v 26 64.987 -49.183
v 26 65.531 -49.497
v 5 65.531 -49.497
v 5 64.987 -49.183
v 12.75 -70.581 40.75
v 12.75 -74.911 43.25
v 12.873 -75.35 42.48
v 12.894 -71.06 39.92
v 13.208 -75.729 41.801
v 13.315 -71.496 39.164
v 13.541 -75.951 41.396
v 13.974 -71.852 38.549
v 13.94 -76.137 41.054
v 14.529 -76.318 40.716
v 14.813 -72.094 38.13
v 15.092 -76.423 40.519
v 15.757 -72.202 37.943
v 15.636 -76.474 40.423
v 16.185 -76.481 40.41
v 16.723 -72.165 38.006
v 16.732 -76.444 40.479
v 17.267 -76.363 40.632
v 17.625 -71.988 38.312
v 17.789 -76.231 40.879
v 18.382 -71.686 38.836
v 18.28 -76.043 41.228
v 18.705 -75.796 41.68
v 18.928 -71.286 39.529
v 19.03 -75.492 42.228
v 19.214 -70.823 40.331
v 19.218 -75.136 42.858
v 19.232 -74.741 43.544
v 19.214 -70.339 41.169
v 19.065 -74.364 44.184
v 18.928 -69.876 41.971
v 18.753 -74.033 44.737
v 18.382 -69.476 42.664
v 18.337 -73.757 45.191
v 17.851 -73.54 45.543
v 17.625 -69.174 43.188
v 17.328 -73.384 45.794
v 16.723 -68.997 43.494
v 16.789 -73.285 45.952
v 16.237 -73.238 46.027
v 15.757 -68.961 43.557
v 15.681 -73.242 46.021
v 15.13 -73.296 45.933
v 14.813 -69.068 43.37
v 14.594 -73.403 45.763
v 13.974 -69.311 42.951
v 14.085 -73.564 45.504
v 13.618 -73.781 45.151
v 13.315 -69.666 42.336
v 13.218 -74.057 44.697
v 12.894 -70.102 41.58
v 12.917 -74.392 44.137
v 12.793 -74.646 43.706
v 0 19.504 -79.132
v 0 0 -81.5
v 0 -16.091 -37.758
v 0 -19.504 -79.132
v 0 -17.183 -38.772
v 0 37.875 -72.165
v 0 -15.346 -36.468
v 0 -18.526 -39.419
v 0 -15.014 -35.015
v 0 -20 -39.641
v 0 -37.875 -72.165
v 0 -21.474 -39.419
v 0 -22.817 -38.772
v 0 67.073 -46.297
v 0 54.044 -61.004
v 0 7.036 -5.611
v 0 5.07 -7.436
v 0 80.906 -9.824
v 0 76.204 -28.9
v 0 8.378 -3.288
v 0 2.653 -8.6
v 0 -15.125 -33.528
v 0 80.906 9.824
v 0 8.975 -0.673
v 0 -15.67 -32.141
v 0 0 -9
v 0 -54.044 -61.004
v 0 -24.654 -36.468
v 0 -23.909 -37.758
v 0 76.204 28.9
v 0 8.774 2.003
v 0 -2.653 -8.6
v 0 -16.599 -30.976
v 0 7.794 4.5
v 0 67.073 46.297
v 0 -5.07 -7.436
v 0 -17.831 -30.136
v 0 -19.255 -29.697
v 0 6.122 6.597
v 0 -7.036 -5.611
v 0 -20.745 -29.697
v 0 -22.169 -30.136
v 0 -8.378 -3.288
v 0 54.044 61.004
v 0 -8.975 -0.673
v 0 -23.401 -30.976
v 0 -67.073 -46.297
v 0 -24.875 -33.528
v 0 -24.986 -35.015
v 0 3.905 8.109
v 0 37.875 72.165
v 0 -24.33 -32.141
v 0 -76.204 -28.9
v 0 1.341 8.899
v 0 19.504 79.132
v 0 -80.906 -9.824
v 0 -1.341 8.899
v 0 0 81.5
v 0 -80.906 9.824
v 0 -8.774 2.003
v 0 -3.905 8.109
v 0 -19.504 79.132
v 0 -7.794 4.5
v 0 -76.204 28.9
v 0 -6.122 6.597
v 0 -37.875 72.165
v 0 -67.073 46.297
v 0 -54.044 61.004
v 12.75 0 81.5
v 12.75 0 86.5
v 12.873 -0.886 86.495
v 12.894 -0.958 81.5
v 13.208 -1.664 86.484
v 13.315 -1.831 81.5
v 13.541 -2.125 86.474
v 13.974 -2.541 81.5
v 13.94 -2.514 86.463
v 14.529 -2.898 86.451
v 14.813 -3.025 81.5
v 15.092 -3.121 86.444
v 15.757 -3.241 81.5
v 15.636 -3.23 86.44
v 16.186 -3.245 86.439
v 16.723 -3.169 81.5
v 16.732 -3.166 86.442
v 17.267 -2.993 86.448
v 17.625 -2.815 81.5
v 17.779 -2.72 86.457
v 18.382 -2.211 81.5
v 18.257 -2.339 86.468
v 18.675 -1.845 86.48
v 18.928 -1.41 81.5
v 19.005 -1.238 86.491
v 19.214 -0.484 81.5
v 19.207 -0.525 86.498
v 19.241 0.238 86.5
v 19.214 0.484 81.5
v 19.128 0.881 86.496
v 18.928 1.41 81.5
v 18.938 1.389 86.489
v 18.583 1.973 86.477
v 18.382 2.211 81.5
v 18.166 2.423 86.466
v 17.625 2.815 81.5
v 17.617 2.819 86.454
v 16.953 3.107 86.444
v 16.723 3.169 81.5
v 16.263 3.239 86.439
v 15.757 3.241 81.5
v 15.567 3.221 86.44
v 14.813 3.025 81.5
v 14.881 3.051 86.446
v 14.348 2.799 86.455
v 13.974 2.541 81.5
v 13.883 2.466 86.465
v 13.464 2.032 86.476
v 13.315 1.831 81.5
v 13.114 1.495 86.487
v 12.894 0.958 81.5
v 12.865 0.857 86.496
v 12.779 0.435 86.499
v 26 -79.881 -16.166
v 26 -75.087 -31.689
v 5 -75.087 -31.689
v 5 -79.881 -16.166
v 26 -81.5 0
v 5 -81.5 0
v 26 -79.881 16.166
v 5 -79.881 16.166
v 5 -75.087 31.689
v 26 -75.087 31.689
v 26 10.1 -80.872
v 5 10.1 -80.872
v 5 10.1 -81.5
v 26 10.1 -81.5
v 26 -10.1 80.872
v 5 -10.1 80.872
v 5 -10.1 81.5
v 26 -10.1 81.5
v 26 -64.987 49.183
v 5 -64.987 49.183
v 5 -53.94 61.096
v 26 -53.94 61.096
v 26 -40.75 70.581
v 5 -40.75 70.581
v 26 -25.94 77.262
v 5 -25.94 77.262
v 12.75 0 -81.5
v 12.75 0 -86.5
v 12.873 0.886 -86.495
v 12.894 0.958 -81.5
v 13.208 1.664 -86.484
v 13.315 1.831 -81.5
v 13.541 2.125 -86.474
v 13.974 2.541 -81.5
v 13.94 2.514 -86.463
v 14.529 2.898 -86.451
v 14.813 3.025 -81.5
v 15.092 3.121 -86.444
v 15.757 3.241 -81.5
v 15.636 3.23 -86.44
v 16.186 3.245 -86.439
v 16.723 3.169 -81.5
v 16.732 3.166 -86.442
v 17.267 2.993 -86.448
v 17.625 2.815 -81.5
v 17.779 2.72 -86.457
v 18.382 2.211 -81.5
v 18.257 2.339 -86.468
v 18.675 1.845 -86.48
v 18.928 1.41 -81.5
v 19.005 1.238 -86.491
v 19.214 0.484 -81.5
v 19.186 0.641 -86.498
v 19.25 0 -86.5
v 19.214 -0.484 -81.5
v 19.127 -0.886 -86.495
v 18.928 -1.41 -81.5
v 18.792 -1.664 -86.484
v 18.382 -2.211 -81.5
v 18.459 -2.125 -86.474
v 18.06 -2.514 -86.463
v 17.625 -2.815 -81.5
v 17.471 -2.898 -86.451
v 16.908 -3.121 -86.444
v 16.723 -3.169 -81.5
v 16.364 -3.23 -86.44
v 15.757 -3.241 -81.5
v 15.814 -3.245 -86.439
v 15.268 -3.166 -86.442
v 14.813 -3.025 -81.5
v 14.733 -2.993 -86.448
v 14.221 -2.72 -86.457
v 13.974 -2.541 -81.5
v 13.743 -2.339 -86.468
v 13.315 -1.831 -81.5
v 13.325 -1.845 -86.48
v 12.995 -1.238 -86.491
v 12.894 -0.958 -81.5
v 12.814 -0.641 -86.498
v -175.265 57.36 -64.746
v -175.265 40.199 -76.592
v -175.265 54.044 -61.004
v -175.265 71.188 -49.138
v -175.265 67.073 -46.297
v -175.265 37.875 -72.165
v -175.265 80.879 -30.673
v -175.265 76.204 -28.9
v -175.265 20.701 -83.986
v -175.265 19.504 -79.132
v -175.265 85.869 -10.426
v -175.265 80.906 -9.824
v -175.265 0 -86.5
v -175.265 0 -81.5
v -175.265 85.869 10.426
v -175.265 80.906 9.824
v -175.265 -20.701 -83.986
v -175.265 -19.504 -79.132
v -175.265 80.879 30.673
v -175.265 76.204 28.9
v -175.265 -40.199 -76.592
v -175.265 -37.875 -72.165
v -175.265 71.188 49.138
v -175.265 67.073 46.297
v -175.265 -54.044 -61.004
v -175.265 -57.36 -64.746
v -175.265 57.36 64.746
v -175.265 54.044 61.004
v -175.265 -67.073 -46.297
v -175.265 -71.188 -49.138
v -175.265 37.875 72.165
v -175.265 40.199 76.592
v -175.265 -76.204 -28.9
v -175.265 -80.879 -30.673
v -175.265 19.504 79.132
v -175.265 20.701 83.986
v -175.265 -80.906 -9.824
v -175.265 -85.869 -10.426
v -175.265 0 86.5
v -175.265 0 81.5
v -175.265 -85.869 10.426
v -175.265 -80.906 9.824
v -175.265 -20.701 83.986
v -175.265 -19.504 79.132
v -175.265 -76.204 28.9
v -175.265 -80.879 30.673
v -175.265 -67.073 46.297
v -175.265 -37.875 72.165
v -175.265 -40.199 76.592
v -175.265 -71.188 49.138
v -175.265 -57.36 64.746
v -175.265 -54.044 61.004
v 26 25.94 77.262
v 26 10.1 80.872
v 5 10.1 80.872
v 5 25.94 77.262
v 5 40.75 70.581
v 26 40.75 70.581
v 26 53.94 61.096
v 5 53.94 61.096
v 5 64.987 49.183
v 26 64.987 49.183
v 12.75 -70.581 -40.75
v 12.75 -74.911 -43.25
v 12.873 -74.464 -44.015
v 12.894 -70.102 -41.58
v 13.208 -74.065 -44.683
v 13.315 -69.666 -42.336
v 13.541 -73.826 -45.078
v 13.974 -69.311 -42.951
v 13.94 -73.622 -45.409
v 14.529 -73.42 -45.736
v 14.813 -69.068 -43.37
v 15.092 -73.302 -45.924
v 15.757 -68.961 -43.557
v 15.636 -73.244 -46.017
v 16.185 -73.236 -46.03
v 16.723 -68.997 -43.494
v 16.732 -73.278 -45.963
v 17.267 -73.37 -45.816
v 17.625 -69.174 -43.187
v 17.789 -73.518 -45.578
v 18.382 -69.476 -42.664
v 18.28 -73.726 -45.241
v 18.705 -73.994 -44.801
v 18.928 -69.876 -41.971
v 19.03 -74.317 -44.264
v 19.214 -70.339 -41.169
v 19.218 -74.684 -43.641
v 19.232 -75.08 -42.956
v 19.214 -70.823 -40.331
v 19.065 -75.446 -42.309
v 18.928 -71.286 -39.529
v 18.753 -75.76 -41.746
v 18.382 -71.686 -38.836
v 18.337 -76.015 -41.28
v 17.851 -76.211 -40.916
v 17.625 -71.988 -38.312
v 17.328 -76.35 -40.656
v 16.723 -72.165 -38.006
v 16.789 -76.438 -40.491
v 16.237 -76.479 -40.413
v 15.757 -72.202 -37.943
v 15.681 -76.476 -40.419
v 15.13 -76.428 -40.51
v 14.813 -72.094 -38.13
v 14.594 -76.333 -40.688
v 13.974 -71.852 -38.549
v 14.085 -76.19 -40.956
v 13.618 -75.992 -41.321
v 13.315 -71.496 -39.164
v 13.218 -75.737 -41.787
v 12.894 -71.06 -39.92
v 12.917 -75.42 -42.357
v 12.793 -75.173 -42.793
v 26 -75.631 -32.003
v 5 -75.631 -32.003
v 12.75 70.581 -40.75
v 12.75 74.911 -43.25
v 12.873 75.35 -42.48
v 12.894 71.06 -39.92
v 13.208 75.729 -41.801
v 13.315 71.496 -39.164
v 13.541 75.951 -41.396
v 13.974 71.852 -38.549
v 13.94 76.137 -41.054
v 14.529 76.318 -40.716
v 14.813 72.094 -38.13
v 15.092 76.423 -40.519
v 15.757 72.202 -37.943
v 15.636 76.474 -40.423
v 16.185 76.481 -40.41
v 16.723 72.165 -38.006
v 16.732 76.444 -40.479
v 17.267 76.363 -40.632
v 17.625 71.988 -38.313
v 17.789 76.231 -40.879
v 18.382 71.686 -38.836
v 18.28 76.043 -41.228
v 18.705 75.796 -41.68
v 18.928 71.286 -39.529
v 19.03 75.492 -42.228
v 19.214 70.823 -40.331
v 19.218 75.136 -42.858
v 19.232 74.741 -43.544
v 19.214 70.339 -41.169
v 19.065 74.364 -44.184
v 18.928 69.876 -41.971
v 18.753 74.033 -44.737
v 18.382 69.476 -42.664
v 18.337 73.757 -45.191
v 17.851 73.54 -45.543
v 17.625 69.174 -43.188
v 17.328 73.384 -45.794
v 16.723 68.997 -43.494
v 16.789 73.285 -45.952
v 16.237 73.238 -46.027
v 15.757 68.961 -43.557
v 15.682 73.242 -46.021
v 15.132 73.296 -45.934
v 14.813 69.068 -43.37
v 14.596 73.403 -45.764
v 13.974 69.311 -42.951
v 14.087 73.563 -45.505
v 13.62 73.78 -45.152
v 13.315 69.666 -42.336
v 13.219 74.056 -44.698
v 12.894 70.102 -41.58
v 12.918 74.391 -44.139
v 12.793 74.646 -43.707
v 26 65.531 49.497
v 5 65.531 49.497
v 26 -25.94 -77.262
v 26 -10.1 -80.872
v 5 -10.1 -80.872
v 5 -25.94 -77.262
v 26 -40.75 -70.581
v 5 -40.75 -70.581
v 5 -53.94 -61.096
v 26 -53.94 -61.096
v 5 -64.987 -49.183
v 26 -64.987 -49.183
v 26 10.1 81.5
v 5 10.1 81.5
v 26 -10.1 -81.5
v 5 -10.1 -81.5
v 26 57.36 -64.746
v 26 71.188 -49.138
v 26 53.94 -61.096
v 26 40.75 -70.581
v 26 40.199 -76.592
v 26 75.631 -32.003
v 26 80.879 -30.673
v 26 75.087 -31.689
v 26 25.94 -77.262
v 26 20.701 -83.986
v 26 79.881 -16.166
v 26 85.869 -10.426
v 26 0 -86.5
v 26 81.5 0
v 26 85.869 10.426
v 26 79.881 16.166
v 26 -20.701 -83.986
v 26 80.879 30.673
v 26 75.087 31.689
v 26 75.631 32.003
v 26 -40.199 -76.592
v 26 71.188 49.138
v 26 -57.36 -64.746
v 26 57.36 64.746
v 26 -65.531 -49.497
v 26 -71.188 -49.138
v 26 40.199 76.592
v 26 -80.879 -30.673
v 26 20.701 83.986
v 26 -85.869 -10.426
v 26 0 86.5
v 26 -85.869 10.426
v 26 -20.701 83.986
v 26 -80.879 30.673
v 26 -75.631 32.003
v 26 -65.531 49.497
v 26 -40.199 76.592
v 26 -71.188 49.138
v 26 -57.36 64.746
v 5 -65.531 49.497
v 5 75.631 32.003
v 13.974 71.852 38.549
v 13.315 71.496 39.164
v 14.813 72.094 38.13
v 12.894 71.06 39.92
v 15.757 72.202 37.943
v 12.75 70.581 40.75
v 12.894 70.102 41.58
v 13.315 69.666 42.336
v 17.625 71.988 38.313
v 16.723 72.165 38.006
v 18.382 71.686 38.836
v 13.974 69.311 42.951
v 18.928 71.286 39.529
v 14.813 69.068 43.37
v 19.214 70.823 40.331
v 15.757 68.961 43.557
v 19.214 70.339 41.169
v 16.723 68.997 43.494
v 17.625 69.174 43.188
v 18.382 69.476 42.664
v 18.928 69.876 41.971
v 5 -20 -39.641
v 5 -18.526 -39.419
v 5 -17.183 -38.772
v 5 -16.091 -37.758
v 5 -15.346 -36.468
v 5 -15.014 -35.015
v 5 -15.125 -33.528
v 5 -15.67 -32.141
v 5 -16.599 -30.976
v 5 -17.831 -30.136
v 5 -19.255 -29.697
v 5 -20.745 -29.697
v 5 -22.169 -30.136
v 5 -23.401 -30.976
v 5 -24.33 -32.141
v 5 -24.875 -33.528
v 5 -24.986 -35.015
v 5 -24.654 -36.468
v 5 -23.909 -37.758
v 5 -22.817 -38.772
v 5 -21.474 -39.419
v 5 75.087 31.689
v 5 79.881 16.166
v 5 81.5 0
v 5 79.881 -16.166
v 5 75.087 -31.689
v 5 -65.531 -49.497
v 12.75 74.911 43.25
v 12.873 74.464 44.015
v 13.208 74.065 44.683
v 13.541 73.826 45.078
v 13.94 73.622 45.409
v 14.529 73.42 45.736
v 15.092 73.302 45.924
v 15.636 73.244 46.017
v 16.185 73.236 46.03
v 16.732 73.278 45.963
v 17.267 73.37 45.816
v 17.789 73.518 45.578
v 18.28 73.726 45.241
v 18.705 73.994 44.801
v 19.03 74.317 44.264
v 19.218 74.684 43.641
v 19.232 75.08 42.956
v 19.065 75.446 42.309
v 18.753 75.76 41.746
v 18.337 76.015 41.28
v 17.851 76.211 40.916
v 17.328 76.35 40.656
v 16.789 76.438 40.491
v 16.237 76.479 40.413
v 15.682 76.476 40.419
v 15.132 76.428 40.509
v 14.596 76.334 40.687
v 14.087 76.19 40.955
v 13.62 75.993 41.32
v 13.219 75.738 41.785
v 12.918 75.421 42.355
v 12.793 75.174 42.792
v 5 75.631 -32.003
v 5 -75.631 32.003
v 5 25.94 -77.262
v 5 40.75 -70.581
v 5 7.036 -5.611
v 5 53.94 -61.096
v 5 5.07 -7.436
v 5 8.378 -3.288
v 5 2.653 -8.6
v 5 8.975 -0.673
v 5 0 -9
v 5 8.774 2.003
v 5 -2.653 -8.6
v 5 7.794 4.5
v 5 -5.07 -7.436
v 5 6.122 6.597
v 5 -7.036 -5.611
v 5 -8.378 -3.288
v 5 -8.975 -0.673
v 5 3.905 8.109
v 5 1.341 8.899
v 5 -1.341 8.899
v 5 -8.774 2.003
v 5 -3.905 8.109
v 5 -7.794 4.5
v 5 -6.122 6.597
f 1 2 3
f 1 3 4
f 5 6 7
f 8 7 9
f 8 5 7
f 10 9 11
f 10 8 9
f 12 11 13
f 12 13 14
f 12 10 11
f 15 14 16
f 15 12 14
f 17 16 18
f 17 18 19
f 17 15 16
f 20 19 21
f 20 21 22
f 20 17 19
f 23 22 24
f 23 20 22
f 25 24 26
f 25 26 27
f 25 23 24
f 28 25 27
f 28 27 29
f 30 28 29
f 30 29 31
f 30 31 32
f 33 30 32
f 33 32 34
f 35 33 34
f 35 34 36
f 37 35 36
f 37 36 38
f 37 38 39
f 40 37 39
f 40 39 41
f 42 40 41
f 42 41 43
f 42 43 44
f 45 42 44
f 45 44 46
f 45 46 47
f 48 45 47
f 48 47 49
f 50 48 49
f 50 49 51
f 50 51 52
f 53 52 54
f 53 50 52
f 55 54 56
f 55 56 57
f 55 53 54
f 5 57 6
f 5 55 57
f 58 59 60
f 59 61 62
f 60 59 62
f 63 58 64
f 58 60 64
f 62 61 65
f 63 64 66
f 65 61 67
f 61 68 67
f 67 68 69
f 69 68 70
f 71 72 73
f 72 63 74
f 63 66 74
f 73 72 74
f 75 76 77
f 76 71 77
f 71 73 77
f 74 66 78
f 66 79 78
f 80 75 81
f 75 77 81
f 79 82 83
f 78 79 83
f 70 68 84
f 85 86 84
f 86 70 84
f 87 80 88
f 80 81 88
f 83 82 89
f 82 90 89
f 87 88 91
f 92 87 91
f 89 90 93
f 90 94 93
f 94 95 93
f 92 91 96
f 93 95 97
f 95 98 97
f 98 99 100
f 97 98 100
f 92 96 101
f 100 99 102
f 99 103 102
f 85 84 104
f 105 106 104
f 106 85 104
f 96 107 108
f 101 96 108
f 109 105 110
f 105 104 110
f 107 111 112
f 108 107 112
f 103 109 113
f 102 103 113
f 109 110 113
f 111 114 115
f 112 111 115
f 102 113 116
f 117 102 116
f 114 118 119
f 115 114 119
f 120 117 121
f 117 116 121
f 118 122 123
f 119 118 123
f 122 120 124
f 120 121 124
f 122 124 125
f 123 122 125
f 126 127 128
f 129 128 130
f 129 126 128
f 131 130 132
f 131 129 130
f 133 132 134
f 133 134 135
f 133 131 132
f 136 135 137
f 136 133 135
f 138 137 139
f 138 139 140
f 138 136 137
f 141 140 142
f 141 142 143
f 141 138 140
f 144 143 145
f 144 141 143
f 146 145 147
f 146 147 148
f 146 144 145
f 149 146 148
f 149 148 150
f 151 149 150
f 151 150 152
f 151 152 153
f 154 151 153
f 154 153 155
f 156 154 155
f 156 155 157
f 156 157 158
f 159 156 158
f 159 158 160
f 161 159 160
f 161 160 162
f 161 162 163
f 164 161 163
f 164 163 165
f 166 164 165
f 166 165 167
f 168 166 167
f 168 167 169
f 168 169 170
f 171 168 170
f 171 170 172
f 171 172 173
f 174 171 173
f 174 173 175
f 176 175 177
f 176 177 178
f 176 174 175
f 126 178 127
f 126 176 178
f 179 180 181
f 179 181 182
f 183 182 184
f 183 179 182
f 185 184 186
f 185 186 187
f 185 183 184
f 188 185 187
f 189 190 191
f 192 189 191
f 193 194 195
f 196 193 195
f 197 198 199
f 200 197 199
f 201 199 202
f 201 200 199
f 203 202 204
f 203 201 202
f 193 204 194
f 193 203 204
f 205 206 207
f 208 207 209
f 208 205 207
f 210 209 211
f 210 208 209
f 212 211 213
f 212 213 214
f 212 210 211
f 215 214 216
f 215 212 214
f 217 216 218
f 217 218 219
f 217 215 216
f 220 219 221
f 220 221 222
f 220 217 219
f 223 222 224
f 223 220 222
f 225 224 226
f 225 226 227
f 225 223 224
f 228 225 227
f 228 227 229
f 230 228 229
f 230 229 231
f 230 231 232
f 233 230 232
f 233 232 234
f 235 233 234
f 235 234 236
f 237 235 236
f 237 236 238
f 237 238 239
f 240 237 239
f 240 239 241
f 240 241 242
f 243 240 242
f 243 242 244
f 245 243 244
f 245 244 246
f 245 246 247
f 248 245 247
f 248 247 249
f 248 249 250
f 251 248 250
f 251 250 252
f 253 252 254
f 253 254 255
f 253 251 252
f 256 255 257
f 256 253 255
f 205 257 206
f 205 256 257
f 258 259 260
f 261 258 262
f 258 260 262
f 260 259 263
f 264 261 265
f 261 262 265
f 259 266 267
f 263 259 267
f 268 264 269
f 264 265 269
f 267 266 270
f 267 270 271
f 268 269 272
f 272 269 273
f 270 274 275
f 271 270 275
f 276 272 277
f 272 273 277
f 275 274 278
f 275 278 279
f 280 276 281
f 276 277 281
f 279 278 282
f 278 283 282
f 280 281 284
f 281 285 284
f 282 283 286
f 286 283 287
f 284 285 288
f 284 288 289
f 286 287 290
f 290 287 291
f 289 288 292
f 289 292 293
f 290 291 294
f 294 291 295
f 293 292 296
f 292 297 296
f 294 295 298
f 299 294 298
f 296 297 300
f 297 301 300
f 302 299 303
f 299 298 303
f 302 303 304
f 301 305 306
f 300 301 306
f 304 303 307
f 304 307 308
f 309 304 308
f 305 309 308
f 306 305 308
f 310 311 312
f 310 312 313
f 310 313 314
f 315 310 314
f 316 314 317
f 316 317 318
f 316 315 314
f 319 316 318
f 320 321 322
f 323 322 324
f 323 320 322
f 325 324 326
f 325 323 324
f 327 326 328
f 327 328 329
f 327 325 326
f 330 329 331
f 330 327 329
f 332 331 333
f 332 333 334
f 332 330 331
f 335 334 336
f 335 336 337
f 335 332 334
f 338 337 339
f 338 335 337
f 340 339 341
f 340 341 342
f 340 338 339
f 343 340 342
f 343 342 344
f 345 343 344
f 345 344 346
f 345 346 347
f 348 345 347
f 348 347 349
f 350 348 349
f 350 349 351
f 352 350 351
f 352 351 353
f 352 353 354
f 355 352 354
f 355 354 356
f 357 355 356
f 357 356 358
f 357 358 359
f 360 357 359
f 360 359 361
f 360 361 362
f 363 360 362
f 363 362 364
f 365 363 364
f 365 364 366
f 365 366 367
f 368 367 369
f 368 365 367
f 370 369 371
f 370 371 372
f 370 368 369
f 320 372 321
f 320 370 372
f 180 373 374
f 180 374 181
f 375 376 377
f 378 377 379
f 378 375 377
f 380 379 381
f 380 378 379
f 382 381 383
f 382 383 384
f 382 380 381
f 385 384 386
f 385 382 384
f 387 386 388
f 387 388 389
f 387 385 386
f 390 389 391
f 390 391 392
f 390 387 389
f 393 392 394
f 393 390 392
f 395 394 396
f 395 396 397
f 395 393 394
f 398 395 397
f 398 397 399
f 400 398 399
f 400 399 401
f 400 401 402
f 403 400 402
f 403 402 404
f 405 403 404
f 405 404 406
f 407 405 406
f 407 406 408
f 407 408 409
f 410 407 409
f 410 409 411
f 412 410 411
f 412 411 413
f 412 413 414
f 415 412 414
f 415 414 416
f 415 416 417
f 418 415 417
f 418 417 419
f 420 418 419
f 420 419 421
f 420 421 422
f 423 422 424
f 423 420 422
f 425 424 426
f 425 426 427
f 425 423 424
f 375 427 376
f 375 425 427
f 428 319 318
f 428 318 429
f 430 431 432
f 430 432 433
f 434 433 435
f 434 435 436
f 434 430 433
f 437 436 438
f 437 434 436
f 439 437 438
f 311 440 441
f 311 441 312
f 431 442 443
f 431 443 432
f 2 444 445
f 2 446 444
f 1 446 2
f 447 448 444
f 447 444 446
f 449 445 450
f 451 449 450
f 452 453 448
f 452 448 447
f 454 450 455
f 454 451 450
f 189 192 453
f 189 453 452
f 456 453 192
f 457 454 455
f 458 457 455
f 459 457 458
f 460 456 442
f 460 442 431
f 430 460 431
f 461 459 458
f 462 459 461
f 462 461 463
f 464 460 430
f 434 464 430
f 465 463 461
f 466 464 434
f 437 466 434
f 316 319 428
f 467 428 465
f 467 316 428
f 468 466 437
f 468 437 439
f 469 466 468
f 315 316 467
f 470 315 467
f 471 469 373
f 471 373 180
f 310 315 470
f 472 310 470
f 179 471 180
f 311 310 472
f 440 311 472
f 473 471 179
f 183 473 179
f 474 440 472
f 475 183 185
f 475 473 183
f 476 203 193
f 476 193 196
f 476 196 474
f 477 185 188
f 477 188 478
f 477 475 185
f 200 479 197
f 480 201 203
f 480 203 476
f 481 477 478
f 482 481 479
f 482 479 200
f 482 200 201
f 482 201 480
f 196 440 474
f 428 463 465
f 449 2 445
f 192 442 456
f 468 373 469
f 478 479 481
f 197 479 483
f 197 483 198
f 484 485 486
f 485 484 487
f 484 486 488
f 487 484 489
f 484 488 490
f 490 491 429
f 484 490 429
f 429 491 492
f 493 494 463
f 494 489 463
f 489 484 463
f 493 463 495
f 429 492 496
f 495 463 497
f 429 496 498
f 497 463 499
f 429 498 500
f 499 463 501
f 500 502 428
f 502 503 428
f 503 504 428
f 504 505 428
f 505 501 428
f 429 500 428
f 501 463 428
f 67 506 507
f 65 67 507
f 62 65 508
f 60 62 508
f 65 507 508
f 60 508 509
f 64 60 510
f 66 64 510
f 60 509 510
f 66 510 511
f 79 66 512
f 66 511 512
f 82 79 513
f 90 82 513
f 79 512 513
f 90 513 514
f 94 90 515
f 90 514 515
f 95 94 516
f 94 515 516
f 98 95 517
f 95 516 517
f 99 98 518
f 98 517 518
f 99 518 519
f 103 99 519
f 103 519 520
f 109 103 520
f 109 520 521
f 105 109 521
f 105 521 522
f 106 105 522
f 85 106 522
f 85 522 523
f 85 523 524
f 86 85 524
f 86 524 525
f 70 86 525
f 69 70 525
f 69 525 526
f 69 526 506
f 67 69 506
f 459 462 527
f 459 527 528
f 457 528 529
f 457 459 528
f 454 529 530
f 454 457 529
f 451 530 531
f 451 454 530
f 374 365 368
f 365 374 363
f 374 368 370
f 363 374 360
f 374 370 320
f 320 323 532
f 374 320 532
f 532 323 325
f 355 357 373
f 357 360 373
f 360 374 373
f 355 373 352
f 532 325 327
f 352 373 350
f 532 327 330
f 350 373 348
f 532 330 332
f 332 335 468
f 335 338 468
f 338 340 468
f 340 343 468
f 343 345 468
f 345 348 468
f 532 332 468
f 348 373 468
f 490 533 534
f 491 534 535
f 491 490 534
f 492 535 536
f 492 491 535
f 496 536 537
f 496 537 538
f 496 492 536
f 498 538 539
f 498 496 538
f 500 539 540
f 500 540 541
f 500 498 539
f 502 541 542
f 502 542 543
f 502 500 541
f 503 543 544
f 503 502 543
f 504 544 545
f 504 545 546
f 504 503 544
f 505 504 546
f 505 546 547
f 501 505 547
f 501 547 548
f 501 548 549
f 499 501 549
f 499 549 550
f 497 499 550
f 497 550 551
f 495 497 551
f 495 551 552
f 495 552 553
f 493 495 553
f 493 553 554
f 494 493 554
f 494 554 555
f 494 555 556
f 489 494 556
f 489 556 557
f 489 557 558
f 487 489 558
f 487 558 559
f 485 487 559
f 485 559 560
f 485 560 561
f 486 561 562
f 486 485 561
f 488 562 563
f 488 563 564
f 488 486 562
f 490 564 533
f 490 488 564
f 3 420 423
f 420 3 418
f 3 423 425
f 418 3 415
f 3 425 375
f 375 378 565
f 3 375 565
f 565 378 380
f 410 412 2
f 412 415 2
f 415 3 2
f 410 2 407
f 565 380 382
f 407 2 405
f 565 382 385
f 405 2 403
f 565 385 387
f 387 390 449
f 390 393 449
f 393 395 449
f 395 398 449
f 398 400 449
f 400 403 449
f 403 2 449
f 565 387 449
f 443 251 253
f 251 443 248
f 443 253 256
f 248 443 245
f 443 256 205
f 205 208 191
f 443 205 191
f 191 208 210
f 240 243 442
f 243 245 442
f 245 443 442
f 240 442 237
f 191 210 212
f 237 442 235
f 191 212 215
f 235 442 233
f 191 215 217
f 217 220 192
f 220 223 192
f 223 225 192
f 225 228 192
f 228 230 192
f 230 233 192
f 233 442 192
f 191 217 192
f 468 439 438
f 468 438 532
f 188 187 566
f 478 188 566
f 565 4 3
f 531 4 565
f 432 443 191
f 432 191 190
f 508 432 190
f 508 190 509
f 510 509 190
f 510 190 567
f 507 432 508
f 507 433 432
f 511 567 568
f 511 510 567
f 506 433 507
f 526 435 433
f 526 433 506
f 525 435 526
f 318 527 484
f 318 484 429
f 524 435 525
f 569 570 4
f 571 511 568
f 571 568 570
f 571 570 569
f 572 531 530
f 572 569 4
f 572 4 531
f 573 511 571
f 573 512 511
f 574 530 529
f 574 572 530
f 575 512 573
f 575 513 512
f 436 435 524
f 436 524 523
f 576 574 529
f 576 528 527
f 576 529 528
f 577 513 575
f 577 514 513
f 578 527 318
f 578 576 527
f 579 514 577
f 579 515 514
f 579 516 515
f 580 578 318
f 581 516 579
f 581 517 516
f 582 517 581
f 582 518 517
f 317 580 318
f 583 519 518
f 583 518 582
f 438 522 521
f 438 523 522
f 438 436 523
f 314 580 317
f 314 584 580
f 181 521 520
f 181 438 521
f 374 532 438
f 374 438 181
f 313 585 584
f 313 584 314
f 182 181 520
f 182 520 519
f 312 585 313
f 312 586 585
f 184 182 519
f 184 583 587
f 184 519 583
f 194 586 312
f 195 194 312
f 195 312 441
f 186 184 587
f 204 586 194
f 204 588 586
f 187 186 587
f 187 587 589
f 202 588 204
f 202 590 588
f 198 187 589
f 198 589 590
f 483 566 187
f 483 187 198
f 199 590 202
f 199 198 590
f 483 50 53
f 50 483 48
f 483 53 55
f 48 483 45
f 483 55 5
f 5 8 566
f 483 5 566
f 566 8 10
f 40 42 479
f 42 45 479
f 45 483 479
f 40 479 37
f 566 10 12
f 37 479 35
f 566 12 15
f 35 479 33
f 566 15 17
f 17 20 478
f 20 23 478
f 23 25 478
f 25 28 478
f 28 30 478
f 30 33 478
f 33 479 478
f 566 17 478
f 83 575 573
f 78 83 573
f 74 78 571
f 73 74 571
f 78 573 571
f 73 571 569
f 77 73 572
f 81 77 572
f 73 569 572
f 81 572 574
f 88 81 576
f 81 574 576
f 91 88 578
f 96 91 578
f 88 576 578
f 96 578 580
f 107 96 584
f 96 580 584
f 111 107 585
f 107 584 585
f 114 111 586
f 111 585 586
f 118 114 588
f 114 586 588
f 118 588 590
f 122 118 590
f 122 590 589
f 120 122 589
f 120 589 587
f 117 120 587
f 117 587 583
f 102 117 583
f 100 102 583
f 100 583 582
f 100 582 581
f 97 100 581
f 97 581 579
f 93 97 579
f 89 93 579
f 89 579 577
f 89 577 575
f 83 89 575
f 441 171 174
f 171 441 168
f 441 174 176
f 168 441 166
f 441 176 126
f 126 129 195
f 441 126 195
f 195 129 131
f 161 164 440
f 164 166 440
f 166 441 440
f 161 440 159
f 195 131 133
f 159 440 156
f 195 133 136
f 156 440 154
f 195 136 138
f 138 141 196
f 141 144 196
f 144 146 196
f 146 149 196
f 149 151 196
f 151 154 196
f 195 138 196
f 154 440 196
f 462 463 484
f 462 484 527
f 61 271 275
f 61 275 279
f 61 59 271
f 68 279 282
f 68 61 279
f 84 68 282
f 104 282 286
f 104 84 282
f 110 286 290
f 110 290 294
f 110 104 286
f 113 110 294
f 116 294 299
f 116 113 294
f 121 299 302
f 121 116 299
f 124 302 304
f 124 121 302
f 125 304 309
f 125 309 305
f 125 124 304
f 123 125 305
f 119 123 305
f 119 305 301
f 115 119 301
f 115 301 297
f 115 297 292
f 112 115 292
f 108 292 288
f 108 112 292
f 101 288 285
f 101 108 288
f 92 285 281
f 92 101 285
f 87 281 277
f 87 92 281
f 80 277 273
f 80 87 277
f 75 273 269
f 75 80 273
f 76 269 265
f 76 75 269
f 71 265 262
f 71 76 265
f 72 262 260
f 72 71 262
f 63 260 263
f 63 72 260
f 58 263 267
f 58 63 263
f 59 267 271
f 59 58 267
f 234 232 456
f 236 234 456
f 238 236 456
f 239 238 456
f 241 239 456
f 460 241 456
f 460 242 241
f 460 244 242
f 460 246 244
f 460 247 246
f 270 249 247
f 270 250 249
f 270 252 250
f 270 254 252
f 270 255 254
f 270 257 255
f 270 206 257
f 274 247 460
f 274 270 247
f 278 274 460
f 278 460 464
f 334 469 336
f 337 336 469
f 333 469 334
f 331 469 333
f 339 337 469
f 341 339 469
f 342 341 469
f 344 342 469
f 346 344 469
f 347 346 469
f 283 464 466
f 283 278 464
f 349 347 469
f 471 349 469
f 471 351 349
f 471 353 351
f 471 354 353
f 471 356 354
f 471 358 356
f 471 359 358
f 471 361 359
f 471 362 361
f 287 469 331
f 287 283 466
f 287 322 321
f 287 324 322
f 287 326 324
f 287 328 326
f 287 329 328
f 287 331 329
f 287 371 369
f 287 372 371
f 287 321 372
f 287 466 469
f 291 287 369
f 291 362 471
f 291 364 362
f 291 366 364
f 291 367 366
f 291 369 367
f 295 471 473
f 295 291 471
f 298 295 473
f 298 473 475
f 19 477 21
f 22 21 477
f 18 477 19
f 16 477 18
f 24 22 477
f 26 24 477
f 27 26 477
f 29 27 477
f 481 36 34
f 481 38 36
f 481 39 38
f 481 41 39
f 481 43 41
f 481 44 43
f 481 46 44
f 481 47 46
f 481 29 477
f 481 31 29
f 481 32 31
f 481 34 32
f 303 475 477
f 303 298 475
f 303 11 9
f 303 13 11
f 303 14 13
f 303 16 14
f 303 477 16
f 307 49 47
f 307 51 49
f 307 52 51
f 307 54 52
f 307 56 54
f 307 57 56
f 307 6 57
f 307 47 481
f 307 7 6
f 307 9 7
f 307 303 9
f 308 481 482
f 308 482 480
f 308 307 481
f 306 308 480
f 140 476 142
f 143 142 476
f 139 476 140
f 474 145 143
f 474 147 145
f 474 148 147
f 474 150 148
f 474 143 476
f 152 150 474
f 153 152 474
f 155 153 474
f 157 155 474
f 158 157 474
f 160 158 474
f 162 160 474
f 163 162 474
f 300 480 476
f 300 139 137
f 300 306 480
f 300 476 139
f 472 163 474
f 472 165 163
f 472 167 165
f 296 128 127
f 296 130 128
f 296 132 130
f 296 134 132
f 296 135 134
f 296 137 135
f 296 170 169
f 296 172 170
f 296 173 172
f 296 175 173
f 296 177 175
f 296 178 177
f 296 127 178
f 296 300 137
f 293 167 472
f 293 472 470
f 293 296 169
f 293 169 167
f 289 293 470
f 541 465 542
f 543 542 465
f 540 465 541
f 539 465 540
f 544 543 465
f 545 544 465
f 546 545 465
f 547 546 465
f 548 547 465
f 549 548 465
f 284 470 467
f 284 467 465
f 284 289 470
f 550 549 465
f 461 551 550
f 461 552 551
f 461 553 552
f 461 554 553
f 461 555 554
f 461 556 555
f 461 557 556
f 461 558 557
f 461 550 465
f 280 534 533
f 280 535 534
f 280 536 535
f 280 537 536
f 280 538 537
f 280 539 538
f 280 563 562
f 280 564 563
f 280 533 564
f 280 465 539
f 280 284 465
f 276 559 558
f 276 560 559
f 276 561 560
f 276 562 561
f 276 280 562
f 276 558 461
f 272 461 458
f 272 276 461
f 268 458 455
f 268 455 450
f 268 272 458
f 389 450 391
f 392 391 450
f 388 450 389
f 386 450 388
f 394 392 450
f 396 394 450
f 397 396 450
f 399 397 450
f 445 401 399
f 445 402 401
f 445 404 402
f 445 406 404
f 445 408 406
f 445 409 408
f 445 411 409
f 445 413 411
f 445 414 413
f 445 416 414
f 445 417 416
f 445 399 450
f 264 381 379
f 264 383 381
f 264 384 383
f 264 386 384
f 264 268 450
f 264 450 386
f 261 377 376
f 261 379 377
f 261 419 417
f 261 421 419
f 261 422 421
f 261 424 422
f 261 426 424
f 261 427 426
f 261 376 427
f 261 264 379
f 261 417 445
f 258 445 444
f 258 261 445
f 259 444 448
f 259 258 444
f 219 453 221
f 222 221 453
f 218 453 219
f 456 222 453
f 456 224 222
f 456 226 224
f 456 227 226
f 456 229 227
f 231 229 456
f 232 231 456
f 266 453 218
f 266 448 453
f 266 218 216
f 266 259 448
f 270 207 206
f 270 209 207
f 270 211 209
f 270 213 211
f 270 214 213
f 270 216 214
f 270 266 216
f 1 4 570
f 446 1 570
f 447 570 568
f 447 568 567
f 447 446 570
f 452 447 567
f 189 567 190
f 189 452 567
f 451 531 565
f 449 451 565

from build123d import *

# Parameters (mm, degrees)
SZKIC1_W                   = 5
SZKIC1_H                   = 5
SZKIC1_W_2                 = 21
SZKIC1_W_3                 = 175.265013497
SZKIC1_H_2                 = 81.5
SZKIC7_R                   = 3.25
WYTNIJ_WYCI_GNI_CIE1_DEPTH = 100
SZYK_KO_OWY1_COUNT         = 6
WYTNIJ_WYCI_GNI_CIE3_DEPTH = 21
SZYK_KO_OWY2_COUNT         = 6
WYTNIJ_WYCI_GNI_CIE2_REACH = 219.853
SZKIC8_R                   = 9
SZKIC8_R_2                 = 5


with BuildPart() as part:
    # Szkic1 → Obrót1 (revolve)
    with BuildSketch(Plane.XY, mode=Mode.PRIVATE) as obr_t1_sk:
        with Locations((2.5, 84)):
            Rectangle(SZKIC1_W, SZKIC1_H)
        with Locations((15.5, 84)):
            Rectangle(SZKIC1_W_2, SZKIC1_H)
        with Locations((-87.632506749, 84)):
            Rectangle(SZKIC1_W_3, SZKIC1_H)
        with Locations((2.5, 40.75)):
            Rectangle(SZKIC1_W, SZKIC1_H_2)
    revolve(obr_t1_sk.sketch.rotate(Axis((5, 0, 0), (-1, 0, 0)), 90), axis=Axis((5, 0, 0), (-1, 0, 0)))

    # Szkic7 → Wytnij-wyciągnięcie1 (cut)
    with BuildSketch(Plane.XY):
        with Locations(Location((16, 0, 0), (0, 0, 180))):
            Circle(SZKIC7_R)
    wytnij_wyci_gni_cie1 = extrude(amount=WYTNIJ_WYCI_GNI_CIE1_DEPTH, mode=Mode.SUBTRACT)

    # Szyk kołowy1: Wytnij-wyciągnięcie1 ×6 about axis
    szyk_ko_owy1_axis = Axis((26, 0, 0), (1, 0, 0))
    for i in range(1, SZYK_KO_OWY1_COUNT):
        add(wytnij_wyci_gni_cie1.rotate(szyk_ko_owy1_axis, i * 360 / SZYK_KO_OWY1_COUNT), mode=Mode.SUBTRACT)

    # Szkic9 → Wytnij-wyciągnięcie3 (cut)
    with BuildSketch(Plane(origin=(26, 0, 0), x_dir=(0, 0, -1), z_dir=(1, 0, 0))):
        Polygon((-81.5, 0), (-81.5, 10.1), (-77.682544911, 10.1), (-77.682544911, -10.1), (-81.5, -10.1), align=None)
    wytnij_wyci_gni_cie3 = extrude(amount=-WYTNIJ_WYCI_GNI_CIE3_DEPTH, mode=Mode.SUBTRACT)

    # Szyk kołowy2: Wytnij-wyciągnięcie3 ×6 about axis
    szyk_ko_owy2_axis = Axis((0, 0, 0), (1, 0, 0))
    for i in range(1, SZYK_KO_OWY2_COUNT):
        add(wytnij_wyci_gni_cie3.rotate(szyk_ko_owy2_axis, i * 360 / SZYK_KO_OWY2_COUNT), mode=Mode.SUBTRACT)

    # Szkic8 → Wytnij-wyciągnięcie2 (cut, up to next)
    with BuildSketch(Plane(origin=(5, 0, 0), x_dir=(0, 0, -1), z_dir=(1, 0, 0)), mode=Mode.PRIVATE) as wytnij_wyci_gni_cie2_sk1:
        Circle(SZKIC8_R)
    wytnij_wyci_gni_cie2_tool1 = extrude(wytnij_wyci_gni_cie2_sk1.sketch, amount=-WYTNIJ_WYCI_GNI_CIE2_REACH, mode=Mode.PRIVATE) & part.part
    # Szkic8 → Wytnij-wyciągnięcie2 (cut, up to next)
    with BuildSketch(Plane(origin=(5, 0, 0), x_dir=(0, 0, -1), z_dir=(1, 0, 0)), mode=Mode.PRIVATE) as wytnij_wyci_gni_cie2_sk2:
        with Locations((34.641016151, -20)):
            Circle(SZKIC8_R_2)
    wytnij_wyci_gni_cie2_tool2 = extrude(wytnij_wyci_gni_cie2_sk2.sketch, amount=-WYTNIJ_WYCI_GNI_CIE2_REACH, mode=Mode.PRIVATE) & part.part
    add(wytnij_wyci_gni_cie2_tool1.solids().sort_by_distance((5, 0, 0))[0], mode=Mode.SUBTRACT)
    add(wytnij_wyci_gni_cie2_tool2.solids().sort_by_distance((5, -20, -34.641016))[0], mode=Mode.SUBTRACT)


solid = part.part
